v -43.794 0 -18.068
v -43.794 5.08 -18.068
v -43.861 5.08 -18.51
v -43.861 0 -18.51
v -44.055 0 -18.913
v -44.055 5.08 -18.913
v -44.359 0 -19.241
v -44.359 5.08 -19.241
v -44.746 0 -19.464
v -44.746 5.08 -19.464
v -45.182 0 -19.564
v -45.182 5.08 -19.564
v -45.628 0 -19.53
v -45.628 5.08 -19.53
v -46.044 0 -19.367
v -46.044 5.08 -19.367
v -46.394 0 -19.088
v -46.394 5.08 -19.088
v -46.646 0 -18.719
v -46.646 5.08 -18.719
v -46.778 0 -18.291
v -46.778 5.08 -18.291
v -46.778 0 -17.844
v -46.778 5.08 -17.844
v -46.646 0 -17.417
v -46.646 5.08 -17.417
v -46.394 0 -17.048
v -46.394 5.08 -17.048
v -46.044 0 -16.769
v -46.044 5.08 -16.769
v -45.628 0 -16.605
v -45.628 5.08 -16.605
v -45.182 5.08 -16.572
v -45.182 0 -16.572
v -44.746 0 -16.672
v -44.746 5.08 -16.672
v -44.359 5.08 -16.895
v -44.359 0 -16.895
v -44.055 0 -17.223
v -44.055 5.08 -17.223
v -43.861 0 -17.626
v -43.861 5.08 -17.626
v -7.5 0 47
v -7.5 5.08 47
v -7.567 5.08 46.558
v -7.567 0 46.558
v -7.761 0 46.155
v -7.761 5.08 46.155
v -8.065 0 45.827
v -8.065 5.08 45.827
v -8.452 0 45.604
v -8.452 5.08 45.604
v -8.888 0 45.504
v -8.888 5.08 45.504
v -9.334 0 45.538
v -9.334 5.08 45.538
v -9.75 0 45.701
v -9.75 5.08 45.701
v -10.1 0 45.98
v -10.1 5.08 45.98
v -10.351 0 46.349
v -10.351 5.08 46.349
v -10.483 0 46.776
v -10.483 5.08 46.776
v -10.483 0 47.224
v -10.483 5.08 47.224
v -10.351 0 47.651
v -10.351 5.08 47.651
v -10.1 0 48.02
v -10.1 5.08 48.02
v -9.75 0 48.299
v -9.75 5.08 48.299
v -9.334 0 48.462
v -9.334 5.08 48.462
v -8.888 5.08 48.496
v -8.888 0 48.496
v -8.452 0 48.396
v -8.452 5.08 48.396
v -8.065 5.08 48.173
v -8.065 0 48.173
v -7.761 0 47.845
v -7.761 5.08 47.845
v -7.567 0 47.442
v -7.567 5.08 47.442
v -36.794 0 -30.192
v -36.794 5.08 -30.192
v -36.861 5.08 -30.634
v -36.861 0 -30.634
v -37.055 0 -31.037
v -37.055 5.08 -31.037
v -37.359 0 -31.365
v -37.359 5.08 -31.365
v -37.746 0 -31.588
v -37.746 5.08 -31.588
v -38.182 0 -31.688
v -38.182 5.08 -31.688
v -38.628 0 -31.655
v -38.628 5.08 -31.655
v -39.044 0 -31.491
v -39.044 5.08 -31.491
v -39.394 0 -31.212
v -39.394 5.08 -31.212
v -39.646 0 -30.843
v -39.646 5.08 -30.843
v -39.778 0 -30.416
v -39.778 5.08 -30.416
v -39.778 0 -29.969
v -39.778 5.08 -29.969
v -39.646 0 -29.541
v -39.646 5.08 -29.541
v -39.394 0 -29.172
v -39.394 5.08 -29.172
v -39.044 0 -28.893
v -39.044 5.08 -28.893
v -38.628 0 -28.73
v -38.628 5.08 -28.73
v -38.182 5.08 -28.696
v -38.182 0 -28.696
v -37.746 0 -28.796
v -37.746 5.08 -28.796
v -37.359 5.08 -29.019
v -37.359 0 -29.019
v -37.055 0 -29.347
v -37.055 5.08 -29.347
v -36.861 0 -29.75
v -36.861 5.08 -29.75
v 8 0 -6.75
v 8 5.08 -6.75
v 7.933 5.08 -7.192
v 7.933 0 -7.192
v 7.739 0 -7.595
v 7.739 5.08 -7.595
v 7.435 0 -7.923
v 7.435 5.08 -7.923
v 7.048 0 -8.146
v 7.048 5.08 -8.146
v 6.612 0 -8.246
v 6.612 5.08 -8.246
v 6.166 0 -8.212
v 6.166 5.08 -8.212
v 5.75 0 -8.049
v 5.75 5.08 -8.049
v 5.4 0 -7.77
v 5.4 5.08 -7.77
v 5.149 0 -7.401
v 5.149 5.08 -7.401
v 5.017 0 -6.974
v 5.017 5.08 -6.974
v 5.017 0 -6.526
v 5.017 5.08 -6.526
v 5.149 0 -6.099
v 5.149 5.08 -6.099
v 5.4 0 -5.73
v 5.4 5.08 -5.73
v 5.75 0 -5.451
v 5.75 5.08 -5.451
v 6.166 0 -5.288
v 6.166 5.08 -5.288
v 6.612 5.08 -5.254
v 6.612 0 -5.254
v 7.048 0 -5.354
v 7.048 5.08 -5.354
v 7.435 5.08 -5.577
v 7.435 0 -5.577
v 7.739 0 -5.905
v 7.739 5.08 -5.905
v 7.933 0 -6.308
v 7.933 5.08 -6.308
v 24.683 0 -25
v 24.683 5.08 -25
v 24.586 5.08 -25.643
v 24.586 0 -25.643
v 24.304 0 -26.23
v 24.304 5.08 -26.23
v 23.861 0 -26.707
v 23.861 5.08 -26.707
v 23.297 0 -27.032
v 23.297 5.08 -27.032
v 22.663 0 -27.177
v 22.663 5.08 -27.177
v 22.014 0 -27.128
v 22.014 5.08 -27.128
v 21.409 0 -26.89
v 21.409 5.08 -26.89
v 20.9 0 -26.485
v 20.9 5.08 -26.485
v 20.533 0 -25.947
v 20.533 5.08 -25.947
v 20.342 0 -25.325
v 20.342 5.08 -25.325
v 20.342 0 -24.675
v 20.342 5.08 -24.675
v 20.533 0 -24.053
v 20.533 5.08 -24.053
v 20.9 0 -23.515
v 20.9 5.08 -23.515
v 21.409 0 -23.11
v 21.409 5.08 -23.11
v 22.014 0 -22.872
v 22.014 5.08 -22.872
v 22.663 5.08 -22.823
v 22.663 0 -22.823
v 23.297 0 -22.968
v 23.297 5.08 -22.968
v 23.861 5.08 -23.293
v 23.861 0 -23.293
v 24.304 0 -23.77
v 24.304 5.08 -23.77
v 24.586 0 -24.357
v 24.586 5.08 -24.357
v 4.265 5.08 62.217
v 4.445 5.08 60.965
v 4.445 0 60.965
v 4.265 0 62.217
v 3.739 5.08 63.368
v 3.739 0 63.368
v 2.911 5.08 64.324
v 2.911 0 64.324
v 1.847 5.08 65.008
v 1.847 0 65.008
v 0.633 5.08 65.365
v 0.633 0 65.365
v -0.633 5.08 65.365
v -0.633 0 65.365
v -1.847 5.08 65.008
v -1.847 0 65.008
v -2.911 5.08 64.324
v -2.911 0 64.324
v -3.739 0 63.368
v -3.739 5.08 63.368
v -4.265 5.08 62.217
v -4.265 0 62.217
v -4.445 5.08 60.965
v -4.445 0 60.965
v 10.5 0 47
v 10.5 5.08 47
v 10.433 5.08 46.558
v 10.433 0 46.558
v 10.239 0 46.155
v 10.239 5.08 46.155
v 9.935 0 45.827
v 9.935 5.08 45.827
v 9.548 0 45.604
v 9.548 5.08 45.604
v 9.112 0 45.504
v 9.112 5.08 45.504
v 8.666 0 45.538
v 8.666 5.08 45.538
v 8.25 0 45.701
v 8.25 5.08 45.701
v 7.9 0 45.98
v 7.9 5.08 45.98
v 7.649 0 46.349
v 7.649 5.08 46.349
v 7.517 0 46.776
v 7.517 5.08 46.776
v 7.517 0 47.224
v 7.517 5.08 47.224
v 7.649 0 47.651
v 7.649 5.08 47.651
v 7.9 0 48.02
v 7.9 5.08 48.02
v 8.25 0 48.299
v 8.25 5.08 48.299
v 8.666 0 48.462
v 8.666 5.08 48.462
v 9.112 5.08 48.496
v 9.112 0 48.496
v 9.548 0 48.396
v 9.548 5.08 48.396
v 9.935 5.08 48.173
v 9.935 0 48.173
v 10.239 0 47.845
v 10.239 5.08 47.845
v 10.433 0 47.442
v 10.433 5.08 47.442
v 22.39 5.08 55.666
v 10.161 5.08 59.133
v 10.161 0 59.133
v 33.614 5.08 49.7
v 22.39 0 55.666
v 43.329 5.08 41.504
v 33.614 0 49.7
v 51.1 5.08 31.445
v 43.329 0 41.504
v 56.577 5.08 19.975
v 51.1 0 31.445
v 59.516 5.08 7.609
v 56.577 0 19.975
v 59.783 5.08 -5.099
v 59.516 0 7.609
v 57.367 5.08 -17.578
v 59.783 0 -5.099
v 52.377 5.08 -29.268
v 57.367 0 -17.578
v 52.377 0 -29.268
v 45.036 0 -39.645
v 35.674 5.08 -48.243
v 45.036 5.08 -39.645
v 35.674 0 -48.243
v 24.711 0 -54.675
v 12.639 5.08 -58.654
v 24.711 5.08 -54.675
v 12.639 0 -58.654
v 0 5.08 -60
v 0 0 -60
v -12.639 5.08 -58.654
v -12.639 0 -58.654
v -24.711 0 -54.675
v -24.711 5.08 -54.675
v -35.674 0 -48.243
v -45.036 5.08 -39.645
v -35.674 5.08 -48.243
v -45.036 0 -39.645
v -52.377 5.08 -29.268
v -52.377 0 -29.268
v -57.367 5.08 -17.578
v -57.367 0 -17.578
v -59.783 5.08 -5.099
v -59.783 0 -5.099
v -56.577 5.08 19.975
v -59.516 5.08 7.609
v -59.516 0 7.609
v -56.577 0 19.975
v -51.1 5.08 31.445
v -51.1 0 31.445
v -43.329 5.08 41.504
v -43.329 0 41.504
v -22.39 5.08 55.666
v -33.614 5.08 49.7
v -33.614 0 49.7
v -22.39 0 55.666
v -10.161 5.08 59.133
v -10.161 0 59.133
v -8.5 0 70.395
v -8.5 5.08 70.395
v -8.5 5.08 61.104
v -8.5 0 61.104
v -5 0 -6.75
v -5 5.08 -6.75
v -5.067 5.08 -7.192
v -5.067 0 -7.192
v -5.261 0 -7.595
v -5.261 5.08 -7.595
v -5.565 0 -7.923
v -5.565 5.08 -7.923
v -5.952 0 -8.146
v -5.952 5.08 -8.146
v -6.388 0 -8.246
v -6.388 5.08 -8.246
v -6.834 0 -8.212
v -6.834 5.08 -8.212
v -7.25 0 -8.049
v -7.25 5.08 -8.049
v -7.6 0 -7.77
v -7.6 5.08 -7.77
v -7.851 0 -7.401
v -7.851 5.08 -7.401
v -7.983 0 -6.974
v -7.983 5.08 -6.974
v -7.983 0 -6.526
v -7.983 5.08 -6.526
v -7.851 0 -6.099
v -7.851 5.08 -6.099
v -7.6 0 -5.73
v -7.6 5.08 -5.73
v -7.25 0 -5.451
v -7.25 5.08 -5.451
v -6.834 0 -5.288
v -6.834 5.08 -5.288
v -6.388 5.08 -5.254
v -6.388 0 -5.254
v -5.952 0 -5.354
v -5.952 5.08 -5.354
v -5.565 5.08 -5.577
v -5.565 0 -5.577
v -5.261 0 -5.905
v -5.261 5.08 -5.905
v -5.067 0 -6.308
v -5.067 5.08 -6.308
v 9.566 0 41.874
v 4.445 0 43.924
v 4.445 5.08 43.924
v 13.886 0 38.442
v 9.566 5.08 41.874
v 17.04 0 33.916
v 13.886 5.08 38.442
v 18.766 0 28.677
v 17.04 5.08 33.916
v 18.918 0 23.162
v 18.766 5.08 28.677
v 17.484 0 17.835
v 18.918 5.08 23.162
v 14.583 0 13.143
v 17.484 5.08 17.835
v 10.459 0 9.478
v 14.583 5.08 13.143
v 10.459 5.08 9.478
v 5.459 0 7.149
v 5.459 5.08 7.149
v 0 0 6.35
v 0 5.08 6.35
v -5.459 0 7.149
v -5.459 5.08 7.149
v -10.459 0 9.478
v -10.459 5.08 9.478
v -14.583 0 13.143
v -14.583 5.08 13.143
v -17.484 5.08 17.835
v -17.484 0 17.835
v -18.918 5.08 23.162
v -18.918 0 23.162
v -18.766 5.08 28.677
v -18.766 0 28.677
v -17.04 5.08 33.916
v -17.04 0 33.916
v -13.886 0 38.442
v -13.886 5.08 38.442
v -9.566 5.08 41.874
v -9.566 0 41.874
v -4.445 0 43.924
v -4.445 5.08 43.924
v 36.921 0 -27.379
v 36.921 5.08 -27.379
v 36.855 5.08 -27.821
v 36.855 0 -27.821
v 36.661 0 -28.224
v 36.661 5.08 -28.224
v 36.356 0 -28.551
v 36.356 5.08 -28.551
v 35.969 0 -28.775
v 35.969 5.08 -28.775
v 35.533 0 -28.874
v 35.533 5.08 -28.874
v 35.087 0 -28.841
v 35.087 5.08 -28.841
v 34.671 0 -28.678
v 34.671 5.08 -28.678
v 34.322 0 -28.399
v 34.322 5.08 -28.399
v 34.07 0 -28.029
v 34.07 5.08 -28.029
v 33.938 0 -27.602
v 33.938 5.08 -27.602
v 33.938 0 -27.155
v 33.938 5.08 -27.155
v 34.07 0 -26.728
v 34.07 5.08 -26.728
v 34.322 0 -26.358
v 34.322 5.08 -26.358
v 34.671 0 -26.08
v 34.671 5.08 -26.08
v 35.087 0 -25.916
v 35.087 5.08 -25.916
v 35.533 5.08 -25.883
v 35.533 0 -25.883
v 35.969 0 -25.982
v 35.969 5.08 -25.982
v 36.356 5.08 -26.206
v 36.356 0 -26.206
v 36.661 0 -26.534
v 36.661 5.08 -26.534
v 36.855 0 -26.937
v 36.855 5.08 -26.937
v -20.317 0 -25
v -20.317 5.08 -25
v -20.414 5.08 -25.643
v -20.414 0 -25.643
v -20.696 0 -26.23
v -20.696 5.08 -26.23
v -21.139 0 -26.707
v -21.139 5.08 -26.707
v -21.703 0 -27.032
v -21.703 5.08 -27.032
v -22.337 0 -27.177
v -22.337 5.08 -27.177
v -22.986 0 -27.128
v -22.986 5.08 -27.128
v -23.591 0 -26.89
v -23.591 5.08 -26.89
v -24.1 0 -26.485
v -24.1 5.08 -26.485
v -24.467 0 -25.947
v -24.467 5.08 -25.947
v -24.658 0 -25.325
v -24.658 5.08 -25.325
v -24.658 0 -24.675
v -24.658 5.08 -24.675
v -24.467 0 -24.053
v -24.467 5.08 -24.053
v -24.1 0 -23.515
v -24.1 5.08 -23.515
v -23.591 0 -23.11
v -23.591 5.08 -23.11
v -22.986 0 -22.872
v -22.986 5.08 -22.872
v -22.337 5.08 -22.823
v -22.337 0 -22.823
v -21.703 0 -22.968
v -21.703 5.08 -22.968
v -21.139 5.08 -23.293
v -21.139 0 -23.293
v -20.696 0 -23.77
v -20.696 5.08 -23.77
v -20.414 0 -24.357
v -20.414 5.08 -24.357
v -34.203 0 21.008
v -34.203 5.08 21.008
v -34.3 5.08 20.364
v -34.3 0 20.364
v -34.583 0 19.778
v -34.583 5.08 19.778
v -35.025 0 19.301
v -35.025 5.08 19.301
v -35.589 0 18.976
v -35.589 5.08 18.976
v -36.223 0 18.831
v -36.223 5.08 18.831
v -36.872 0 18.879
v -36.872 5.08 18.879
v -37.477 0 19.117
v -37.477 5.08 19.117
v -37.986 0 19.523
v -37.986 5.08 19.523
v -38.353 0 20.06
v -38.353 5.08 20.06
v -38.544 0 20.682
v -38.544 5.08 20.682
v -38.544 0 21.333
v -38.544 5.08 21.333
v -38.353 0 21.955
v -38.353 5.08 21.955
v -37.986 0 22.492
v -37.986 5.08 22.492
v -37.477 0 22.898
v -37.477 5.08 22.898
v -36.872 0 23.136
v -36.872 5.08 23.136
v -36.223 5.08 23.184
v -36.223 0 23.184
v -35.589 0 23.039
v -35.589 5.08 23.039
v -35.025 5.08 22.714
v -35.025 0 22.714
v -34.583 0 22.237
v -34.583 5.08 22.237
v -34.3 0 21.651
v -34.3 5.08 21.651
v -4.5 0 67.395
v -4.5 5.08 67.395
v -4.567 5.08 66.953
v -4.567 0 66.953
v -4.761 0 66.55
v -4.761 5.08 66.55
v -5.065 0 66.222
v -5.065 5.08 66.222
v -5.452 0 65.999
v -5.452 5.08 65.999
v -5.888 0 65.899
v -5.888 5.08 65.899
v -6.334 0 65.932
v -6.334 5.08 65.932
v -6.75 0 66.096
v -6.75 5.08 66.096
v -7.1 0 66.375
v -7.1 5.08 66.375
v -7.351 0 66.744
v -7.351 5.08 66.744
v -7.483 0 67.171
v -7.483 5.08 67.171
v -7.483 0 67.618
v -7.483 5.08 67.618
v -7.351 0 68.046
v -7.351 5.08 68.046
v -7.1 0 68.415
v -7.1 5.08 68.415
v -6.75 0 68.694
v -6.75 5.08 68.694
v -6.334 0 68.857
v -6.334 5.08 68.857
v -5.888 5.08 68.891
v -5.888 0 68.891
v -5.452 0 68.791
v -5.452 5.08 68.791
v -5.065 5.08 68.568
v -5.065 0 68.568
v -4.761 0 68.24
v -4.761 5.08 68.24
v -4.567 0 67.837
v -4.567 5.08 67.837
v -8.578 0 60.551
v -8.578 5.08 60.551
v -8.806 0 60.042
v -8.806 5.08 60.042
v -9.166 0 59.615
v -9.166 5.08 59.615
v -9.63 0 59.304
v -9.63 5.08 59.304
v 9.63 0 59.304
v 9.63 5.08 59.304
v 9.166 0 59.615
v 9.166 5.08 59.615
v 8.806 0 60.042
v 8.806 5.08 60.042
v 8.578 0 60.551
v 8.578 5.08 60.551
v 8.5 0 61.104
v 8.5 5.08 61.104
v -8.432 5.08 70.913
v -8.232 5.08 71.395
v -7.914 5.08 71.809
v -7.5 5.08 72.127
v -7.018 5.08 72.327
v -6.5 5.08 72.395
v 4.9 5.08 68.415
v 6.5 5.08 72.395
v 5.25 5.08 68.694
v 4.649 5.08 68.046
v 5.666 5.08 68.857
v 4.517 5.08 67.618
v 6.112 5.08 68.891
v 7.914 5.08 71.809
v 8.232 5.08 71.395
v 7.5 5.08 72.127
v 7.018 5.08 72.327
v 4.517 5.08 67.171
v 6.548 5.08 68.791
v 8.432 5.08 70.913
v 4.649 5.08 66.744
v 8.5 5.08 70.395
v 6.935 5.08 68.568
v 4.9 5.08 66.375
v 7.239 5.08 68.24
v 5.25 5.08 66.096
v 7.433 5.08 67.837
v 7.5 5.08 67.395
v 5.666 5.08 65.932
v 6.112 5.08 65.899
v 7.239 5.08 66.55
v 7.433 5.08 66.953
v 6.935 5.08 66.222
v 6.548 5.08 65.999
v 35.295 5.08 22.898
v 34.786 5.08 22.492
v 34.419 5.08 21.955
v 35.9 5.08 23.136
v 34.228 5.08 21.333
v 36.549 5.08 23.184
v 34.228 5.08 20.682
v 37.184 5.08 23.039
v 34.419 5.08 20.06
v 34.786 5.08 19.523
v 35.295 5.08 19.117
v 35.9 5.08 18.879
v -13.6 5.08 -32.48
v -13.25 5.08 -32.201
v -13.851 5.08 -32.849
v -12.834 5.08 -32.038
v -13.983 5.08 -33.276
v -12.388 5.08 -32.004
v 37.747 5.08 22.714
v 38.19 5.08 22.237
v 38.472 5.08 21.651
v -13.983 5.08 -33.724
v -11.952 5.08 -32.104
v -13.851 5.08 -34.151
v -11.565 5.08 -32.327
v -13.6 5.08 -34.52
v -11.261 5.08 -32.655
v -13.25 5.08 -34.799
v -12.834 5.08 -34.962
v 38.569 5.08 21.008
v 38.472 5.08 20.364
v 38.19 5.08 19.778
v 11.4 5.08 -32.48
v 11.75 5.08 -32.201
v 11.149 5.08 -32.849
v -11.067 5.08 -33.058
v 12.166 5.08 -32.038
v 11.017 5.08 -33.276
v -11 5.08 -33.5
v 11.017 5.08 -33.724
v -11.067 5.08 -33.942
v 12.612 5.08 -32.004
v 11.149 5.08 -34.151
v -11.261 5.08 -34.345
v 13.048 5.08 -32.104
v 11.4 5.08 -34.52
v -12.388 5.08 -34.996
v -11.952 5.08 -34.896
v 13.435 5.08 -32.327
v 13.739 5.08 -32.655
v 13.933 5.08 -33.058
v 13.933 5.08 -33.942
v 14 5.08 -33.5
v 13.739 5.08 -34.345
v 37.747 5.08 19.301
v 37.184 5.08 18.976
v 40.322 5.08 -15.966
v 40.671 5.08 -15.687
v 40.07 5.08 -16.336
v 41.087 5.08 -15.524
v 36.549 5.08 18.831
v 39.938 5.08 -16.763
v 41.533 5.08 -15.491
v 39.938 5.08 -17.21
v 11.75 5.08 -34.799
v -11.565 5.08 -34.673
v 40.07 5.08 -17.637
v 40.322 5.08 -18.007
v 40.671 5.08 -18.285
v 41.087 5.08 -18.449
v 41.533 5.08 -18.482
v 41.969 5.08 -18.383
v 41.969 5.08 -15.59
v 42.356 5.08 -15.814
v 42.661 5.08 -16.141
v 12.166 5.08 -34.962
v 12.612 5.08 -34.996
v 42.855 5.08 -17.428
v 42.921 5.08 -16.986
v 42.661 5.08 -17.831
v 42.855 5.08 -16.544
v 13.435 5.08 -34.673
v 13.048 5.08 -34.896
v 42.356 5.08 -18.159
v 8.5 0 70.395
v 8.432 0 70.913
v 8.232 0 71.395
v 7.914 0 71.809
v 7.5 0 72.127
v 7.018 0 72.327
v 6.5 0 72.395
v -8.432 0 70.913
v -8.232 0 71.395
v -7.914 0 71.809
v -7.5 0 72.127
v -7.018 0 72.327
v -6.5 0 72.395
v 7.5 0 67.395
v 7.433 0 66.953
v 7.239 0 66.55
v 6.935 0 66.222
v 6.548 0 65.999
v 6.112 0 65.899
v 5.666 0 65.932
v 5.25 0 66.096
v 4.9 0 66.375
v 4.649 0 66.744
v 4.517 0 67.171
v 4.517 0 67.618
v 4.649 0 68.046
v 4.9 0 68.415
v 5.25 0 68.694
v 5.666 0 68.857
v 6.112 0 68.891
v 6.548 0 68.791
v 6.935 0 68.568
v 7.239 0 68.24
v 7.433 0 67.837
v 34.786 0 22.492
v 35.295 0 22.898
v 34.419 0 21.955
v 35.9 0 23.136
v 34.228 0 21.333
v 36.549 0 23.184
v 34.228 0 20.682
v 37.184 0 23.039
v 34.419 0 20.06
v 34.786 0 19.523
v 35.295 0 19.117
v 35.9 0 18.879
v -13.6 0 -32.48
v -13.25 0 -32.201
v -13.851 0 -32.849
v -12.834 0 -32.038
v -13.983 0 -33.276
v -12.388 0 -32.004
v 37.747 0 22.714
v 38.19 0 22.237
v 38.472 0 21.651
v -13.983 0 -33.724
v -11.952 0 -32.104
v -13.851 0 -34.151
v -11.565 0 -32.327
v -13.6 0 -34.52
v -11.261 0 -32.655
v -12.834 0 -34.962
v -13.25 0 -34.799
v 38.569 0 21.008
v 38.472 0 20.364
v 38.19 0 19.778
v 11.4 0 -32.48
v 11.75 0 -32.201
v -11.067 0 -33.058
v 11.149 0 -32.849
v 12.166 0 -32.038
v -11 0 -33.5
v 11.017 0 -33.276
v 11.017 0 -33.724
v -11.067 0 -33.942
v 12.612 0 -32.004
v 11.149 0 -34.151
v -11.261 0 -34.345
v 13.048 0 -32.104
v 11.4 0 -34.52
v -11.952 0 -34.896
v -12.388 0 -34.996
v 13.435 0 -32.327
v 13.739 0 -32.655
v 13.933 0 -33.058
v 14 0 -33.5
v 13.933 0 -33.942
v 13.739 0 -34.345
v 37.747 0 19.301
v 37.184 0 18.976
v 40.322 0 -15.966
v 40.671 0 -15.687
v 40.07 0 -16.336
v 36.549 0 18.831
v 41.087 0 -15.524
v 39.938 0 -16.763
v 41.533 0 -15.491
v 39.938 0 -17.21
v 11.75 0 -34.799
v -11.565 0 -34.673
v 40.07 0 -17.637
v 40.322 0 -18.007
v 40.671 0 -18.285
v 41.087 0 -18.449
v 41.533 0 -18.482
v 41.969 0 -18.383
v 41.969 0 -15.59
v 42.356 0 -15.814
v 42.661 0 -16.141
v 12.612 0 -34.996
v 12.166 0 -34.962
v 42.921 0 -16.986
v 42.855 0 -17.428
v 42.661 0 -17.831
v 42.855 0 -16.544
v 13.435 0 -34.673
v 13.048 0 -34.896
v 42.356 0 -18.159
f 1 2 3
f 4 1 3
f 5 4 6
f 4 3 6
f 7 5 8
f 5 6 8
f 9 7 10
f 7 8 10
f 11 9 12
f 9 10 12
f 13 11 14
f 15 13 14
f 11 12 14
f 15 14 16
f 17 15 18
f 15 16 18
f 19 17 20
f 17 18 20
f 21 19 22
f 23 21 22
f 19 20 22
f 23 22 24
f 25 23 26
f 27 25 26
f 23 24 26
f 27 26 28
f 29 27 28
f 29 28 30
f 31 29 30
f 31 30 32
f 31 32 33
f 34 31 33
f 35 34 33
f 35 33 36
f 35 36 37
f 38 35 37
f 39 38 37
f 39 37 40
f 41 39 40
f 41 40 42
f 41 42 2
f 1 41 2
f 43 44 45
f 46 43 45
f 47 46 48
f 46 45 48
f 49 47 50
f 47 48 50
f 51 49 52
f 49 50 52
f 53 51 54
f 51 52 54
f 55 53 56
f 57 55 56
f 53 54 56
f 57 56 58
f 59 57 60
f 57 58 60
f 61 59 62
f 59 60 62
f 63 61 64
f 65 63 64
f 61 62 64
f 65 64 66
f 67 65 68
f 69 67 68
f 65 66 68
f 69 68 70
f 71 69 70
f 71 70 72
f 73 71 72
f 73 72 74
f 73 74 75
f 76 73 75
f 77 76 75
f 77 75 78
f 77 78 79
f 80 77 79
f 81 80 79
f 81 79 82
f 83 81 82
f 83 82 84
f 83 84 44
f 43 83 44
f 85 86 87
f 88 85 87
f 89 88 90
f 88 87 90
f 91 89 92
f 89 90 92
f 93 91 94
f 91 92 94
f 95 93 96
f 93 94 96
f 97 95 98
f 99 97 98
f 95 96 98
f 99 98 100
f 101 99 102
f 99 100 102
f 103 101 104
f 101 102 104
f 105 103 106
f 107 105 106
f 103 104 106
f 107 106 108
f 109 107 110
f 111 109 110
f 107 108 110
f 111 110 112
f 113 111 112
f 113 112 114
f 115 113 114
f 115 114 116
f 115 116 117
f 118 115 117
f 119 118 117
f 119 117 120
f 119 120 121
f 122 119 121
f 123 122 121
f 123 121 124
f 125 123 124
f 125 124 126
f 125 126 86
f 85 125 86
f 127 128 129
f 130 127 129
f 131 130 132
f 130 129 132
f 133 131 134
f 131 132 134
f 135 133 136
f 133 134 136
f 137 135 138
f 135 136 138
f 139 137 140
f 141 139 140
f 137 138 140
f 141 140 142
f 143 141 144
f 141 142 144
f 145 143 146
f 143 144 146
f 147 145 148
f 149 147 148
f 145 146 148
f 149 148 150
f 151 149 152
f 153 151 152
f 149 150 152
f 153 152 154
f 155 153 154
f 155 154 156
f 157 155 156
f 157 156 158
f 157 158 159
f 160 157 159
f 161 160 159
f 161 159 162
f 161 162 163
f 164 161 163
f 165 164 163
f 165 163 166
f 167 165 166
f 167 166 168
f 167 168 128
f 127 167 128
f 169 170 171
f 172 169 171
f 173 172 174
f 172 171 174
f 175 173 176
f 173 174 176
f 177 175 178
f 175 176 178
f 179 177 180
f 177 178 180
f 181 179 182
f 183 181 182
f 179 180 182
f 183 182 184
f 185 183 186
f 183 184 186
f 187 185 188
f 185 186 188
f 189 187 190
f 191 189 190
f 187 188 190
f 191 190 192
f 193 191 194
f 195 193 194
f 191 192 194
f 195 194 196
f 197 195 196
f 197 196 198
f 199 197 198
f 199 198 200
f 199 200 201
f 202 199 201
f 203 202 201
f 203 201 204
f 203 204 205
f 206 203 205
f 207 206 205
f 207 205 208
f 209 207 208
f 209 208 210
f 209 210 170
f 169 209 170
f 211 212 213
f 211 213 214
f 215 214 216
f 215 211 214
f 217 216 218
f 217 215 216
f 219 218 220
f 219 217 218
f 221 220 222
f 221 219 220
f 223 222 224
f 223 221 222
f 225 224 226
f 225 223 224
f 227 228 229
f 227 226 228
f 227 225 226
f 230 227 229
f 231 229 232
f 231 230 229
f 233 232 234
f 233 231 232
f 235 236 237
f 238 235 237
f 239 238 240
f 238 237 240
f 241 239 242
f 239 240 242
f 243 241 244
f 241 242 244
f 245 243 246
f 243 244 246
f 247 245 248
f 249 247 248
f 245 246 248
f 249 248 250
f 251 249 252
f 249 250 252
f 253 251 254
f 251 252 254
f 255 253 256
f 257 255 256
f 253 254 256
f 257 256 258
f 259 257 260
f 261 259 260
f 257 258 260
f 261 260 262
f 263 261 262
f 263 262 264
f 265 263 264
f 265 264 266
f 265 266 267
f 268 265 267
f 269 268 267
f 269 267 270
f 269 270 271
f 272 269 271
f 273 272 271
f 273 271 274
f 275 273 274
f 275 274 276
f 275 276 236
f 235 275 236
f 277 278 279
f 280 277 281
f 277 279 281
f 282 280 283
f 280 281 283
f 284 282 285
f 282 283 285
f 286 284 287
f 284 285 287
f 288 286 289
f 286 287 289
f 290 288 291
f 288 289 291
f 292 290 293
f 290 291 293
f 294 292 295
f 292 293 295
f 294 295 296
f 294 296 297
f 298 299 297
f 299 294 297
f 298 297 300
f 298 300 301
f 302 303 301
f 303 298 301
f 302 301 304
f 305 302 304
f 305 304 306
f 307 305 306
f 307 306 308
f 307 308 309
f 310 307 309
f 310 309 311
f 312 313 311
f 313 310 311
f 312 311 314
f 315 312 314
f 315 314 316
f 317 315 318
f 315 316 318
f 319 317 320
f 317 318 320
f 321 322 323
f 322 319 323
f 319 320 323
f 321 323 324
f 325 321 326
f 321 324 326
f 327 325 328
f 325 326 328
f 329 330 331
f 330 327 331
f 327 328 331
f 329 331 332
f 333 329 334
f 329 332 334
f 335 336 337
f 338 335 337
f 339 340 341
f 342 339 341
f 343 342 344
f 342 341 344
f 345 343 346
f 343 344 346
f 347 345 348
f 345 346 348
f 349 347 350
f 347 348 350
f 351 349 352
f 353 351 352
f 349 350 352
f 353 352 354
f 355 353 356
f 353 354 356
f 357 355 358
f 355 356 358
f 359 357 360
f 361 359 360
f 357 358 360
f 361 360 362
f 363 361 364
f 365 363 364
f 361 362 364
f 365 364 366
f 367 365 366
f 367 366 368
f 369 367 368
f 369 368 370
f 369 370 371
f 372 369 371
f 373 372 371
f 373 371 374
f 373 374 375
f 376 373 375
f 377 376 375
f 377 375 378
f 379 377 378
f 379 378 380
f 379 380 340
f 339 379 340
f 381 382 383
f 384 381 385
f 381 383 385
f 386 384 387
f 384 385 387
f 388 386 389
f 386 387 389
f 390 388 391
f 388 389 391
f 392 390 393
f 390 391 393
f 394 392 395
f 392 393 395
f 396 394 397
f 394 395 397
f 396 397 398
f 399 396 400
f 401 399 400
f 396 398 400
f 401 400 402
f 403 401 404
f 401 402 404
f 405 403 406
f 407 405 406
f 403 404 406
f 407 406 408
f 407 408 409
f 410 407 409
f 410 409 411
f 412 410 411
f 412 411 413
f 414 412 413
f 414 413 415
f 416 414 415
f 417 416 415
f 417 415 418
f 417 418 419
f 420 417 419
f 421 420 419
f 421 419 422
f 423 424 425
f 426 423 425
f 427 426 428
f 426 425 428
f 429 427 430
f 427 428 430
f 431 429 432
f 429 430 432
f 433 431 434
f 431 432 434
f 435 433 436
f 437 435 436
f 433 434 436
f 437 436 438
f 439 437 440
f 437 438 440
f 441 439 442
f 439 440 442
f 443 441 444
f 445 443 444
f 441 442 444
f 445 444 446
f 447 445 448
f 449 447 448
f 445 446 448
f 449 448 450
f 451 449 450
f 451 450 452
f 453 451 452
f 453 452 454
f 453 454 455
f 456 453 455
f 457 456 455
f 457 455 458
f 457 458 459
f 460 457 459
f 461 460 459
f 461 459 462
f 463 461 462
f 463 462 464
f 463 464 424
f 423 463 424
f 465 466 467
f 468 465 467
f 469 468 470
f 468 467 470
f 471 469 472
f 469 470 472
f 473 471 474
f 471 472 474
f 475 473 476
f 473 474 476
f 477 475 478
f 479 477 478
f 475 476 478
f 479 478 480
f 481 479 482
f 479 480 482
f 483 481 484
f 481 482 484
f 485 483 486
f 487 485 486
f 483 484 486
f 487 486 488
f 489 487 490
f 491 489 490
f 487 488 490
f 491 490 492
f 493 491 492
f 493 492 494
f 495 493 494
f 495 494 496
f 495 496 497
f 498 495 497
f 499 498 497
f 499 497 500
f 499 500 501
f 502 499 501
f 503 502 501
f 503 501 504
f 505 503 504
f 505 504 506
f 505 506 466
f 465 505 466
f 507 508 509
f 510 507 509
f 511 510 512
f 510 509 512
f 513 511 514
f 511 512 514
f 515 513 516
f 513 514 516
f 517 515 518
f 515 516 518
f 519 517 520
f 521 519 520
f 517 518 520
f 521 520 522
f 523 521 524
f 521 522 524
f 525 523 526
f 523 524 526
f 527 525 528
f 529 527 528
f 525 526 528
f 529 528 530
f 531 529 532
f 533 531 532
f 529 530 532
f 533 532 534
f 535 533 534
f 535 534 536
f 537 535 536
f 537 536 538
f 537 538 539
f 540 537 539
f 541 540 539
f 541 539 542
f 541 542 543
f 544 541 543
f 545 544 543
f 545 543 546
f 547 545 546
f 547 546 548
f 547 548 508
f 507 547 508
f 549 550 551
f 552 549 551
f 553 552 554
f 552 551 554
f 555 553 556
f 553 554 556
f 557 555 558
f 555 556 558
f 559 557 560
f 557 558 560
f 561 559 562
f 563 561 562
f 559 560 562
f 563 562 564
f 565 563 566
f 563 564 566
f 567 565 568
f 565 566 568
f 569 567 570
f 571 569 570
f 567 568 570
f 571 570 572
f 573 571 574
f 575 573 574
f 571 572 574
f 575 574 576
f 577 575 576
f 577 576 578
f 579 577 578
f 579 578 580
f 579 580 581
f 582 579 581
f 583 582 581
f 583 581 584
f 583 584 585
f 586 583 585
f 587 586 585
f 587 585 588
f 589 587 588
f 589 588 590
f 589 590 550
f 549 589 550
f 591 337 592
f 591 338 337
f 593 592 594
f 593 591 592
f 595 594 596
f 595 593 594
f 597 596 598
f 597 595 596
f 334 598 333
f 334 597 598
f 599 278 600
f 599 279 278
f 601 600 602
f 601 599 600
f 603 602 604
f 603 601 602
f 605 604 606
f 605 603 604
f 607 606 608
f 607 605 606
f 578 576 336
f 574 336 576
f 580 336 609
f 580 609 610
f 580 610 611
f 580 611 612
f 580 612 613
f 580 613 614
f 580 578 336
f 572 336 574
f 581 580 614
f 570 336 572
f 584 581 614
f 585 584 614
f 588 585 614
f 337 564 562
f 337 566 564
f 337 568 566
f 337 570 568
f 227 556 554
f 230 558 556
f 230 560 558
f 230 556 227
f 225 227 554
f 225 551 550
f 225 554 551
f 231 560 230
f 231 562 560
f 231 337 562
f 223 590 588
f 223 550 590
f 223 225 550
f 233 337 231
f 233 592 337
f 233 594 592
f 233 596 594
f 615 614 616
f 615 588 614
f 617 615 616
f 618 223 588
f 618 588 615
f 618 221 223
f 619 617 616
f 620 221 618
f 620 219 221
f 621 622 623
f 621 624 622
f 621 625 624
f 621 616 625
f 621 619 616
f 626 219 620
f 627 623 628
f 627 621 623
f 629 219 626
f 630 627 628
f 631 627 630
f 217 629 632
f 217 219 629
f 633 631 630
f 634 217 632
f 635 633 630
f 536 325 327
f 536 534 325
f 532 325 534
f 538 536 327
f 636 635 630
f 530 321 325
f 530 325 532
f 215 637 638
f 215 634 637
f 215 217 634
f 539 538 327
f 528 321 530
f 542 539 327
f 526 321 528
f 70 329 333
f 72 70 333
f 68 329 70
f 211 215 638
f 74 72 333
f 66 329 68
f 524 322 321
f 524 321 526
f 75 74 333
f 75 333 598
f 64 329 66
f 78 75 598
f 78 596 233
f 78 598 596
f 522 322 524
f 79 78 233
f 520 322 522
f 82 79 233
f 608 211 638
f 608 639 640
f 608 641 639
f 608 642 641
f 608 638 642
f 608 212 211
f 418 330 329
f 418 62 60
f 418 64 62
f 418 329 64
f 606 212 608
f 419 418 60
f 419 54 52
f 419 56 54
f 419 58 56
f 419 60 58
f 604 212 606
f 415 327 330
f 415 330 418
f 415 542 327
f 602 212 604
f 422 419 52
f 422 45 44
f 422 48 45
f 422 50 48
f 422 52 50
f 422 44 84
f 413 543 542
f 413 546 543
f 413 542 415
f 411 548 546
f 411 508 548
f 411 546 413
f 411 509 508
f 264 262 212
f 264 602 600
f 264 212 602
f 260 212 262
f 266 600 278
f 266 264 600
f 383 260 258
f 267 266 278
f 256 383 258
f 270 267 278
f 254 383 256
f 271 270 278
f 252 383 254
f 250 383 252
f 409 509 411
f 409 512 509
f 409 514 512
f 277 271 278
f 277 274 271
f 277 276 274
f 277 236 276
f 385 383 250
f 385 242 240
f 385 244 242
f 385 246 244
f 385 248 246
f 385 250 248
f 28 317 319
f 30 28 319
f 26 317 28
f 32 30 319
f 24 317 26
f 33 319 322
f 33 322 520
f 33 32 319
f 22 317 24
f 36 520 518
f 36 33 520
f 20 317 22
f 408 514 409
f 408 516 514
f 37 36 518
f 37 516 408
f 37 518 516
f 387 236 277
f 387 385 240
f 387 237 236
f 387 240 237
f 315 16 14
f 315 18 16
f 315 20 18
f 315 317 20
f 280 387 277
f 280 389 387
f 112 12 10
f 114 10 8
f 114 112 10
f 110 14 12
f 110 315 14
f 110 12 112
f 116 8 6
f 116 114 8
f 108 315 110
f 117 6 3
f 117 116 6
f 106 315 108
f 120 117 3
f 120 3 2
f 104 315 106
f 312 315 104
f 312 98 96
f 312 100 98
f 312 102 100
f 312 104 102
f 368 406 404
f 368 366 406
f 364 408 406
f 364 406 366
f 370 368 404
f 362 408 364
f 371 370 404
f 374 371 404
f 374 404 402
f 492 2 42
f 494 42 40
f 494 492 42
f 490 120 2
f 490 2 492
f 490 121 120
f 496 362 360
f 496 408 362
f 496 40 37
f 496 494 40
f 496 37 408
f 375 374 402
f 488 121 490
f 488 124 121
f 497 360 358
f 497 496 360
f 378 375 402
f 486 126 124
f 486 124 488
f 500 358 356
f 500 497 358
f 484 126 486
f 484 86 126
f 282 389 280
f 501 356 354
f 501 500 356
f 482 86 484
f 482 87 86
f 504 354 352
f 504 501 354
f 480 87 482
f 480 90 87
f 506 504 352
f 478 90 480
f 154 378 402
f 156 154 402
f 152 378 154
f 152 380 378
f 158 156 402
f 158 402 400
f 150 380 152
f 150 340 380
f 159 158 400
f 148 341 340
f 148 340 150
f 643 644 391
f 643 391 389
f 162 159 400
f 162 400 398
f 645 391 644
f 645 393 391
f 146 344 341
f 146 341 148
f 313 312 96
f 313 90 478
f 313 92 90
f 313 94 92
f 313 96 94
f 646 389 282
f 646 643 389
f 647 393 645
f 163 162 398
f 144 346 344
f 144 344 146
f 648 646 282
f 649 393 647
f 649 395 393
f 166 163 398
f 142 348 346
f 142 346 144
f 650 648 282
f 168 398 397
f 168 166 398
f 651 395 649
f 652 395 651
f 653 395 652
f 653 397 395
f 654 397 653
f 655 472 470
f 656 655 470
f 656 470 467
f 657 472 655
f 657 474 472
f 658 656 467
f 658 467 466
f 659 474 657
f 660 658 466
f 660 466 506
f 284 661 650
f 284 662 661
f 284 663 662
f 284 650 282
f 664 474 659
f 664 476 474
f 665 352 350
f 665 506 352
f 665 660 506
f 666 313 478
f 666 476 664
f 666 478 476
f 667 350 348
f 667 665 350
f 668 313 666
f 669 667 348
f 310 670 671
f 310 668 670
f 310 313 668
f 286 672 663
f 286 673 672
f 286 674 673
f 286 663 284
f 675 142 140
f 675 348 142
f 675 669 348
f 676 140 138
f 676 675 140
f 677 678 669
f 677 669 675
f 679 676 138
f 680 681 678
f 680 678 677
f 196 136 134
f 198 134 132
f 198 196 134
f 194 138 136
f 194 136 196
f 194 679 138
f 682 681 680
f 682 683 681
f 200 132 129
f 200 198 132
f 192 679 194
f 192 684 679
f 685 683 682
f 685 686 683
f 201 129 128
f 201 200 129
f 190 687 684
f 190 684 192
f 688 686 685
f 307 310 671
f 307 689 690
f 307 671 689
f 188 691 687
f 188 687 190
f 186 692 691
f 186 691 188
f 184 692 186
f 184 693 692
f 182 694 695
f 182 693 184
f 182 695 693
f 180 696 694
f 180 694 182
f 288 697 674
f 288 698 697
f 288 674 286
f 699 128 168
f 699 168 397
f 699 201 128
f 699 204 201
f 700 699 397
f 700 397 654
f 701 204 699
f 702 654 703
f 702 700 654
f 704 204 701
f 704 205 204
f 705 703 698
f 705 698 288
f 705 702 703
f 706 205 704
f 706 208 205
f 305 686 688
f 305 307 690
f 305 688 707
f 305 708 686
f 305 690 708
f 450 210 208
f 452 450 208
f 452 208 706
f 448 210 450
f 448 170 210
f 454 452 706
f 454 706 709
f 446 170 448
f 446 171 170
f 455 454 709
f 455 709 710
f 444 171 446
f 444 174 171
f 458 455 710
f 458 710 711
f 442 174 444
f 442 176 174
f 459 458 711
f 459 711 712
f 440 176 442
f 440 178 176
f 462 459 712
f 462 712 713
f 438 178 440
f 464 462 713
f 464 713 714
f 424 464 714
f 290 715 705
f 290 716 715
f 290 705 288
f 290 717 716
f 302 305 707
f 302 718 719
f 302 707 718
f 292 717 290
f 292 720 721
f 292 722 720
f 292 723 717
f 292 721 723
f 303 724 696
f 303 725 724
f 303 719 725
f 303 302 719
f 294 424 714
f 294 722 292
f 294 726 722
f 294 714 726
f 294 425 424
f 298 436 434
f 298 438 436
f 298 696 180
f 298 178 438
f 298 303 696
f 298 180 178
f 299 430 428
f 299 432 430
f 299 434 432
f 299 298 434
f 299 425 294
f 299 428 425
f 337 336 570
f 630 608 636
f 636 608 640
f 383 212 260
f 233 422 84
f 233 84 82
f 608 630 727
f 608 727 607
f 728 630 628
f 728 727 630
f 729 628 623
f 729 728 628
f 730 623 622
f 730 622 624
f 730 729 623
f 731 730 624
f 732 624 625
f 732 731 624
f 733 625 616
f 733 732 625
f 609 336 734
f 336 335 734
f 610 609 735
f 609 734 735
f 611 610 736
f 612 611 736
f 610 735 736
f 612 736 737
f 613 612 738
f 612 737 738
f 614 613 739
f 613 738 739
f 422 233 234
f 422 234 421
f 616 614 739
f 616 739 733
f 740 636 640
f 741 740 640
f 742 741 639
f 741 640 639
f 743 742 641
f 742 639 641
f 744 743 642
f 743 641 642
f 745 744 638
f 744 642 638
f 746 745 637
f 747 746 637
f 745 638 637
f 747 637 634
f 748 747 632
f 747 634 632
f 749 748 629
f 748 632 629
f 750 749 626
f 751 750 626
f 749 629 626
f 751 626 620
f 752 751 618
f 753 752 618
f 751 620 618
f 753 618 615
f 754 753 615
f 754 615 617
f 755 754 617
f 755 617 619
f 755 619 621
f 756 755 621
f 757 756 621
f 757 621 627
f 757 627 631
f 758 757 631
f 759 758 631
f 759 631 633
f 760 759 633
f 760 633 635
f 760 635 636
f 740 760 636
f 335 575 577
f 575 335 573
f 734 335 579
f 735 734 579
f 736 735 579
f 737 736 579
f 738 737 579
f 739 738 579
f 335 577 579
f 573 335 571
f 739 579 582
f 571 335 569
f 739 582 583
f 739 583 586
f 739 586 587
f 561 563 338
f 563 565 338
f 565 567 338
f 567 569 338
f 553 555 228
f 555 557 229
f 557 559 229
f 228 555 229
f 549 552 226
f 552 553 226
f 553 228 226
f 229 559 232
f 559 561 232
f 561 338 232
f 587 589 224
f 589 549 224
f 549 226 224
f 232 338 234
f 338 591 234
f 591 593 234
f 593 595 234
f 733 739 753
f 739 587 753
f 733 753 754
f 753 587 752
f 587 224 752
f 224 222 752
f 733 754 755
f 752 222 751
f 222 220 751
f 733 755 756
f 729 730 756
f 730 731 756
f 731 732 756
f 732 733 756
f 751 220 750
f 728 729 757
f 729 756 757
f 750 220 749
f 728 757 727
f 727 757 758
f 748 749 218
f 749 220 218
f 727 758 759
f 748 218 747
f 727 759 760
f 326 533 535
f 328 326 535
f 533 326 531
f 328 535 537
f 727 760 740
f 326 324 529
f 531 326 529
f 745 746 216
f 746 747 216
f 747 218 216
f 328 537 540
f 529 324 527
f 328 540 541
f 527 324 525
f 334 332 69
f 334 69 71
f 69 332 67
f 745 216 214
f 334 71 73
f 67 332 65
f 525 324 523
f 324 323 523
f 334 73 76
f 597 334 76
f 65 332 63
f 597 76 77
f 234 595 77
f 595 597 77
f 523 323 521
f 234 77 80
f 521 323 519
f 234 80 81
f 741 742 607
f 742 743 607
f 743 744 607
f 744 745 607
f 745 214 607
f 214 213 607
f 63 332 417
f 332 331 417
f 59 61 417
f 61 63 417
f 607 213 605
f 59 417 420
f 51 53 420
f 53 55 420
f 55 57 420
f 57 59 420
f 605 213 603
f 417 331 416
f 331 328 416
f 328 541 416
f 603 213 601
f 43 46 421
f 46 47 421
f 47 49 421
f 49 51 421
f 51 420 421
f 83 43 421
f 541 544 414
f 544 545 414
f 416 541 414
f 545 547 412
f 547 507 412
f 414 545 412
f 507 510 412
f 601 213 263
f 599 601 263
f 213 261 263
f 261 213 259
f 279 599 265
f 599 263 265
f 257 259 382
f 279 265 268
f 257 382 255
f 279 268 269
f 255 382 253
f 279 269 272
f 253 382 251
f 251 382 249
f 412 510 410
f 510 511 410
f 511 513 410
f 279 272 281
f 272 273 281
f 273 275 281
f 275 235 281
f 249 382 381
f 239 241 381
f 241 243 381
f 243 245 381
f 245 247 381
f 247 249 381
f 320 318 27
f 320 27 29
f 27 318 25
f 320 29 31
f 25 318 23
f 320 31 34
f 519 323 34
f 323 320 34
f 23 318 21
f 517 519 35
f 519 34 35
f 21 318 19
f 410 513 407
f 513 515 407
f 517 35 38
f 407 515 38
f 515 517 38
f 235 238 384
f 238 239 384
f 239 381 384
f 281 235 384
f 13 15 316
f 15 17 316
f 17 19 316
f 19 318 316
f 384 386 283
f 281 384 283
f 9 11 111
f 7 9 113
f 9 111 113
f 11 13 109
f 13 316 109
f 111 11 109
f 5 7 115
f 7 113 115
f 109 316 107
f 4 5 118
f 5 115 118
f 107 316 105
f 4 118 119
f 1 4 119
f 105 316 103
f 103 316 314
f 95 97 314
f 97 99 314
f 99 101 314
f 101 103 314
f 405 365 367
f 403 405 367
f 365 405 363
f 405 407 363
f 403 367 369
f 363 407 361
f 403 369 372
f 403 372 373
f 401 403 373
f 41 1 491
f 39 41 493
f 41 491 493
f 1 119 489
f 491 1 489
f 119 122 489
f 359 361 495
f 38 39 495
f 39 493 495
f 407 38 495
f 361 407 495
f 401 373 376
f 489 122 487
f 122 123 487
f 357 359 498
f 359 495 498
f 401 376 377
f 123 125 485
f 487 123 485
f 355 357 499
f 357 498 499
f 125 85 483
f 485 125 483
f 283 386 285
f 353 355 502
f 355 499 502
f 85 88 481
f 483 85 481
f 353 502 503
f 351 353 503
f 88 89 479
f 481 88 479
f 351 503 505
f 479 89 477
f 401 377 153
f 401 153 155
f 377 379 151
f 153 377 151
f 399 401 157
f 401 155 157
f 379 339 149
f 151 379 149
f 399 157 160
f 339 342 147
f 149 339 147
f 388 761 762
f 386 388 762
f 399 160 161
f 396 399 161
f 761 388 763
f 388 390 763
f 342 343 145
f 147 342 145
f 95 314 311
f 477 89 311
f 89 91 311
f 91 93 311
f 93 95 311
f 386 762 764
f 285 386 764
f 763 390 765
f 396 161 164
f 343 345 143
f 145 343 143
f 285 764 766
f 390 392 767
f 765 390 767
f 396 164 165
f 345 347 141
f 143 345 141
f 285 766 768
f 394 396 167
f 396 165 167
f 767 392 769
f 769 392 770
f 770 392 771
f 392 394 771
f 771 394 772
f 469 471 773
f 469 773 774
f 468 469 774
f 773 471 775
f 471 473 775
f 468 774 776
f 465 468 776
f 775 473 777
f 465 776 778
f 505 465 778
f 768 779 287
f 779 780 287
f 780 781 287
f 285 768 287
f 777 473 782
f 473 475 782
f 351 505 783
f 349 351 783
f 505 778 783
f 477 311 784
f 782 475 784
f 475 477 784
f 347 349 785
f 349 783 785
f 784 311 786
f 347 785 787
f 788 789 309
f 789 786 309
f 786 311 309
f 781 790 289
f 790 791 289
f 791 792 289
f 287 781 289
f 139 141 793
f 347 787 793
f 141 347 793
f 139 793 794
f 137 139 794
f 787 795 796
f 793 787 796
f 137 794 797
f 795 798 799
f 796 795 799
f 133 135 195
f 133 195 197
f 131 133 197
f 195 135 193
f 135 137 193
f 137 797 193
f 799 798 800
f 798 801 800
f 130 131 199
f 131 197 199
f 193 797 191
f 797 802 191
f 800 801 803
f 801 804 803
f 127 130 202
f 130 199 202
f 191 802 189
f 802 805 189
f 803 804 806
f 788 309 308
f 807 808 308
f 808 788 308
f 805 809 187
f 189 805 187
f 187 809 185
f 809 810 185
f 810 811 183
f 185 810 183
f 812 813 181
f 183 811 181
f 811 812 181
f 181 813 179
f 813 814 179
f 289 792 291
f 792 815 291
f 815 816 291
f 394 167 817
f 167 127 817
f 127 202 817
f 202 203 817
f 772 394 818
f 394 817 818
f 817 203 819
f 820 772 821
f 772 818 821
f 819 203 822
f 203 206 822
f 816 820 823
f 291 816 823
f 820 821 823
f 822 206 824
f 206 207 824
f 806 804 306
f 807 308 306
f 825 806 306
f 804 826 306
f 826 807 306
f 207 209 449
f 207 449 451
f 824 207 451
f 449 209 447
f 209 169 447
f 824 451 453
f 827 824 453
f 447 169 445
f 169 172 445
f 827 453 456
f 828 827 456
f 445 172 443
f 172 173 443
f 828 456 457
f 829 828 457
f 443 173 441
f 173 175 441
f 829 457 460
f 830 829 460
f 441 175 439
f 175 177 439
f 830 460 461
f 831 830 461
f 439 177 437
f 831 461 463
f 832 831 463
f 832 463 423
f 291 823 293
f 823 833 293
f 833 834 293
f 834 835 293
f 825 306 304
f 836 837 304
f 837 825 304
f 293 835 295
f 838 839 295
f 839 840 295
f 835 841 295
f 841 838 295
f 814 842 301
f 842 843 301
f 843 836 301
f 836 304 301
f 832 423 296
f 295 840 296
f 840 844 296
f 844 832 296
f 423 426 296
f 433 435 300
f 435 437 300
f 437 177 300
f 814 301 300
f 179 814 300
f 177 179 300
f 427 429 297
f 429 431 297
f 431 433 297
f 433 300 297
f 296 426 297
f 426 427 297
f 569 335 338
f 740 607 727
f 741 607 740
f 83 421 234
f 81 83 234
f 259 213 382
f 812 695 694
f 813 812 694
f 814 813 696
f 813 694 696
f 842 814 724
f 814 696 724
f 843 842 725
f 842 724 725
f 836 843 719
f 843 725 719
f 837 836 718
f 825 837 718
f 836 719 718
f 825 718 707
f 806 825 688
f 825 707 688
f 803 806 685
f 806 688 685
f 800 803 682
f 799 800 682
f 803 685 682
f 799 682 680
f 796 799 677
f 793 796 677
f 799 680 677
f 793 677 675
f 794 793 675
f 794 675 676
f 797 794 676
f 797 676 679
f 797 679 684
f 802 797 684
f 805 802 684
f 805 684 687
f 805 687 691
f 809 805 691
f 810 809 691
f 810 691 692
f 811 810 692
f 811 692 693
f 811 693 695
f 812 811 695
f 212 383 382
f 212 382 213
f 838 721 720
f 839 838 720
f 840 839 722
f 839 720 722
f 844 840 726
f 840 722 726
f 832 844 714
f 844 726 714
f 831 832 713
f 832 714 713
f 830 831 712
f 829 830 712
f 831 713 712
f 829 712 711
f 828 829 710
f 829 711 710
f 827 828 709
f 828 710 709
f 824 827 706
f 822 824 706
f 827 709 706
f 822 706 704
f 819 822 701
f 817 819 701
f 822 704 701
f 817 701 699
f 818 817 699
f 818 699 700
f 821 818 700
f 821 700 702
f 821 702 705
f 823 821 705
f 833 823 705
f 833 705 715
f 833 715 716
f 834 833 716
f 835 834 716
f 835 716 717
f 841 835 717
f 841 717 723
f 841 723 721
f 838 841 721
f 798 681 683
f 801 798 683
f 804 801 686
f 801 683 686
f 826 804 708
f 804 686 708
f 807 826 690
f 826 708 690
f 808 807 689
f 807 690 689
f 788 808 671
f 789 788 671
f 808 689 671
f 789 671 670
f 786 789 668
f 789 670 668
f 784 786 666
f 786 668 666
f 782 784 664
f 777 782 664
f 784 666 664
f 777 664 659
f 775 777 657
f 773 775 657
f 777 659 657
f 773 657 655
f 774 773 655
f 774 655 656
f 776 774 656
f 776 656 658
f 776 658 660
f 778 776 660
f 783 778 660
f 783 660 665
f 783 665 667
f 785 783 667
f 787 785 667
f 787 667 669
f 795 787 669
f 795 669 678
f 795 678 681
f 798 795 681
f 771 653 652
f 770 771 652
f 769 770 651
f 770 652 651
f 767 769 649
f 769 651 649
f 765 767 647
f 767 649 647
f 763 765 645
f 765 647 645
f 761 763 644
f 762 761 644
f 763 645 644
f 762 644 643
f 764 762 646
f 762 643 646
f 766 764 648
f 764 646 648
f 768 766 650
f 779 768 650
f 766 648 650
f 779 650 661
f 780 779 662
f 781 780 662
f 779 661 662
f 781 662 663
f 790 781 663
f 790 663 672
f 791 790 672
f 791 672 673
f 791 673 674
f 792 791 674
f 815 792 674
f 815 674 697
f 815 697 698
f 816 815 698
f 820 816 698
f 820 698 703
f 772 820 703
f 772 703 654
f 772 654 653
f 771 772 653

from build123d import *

# Parameters (mm, degrees)
SKETCH1_R           = 60
BOSS_EXTRUDE1_DEPTH = 5.08
SKETCH2_R           = 2.1828125
CUT_EXTRUDE1_DEPTH  = 6.08
CIRPATTERN1_COUNT   = 2
CIRPATTERN1_ANGLE   = 120
SKETCH3_R           = 1.5
CUT_EXTRUDE2_DEPTH  = 6.08
SKETCH5_R           = 2.1828125
CUT_EXTRUDE4_DEPTH  = 6.08
SKETCH6_R           = 19.05
CUT_EXTRUDE5_DEPTH  = 6.08
SKETCH9_W           = 17
SKETCH9_H           = 13
BOSS_EXTRUDE2_DEPTH = 5.08
SKETCH7_R           = 1.5
CUT_EXTRUDE6_DEPTH  = 6.08
FILLET1_R           = 2
FILLET2_R           = 2


with BuildPart() as part:
    # Sketch1 → Boss-Extrude1 (new body)
    with BuildSketch(Plane(origin=(0, 0, 0), x_dir=(1, 0, 0), z_dir=(0, 1, 0))):
        Circle(SKETCH1_R)
    extrude(amount=BOSS_EXTRUDE1_DEPTH)

    # Sketch2 → Cut-Extrude1 (cut, through all)
    with BuildSketch(Plane(origin=(0, 5.08, 0), x_dir=(1, 0, 0), z_dir=(0, 1, 0))):
        with Locations((-36.386057378, -21.007500022)):
            Circle(SKETCH2_R)
    cut_extrude1 = extrude(amount=-CUT_EXTRUDE1_DEPTH, mode=Mode.SUBTRACT)

    # CirPattern1: Cut-Extrude1 ×2 about axis
    cirpattern1_axis = Axis((0, 5.08, 0), (0, 1, 0))
    for i in range(1, CIRPATTERN1_COUNT):
        add(cut_extrude1.rotate(cirpattern1_axis, i * CIRPATTERN1_ANGLE / (CIRPATTERN1_COUNT - 1)), mode=Mode.SUBTRACT)

    # Sketch3 → Cut-Extrude2 (cut, through all)
    with BuildSketch(Plane(origin=(0, 5.08, 0), x_dir=(1, 0, 0), z_dir=(0, 1, 0))):
        with Locations((-6.5, 6.749999962)):
            Circle(SKETCH3_R)
        with Locations((6.5, 6.749999962)):
            Circle(SKETCH3_R)
        with Locations((-12.5, 33.500000056)):
            Circle(SKETCH3_R)
        with Locations((12.5, 33.500000056)):
            Circle(SKETCH3_R)
        with Locations((35.421216966, 27.378652381)):
            Circle(SKETCH3_R)
        with Locations((41.421216966, 16.986347535)):
            Circle(SKETCH3_R)
        with Locations((-45.294385987, 18.067822174)):
            Circle(SKETCH3_R)
        with Locations((-38.294385987, 30.192177826)):
            Circle(SKETCH3_R)
    extrude(amount=-CUT_EXTRUDE2_DEPTH, mode=Mode.SUBTRACT)

    # Sketch5 → Cut-Extrude4 (cut, through all)
    with BuildSketch(Plane(origin=(0, 5.08, 0), x_dir=(1, 0, 0), z_dir=(0, 1, 0))):
        with Locations((-22.5, 25)):
            Circle(SKETCH5_R)
        with Locations((22.5, 25)):
            Circle(SKETCH5_R)
    extrude(amount=-CUT_EXTRUDE4_DEPTH, mode=Mode.SUBTRACT)

    # Sketch6 → Cut-Extrude5 (cut, through all)
    with BuildSketch(Plane(origin=(0, 5.08, 0), x_dir=(1, 0, 0), z_dir=(0, 1, 0))):
        with Locations((0, -25.4)):
            Circle(SKETCH6_R)
    extrude(amount=-CUT_EXTRUDE5_DEPTH, mode=Mode.SUBTRACT)

    # Sketch9 → Boss-Extrude2 (add)
    with BuildSketch(Plane(origin=(0, 5.08, 0), x_dir=(1, 0, 0), z_dir=(0, 1, 0))):
        with Locations((0, -65.894865098)):
            Rectangle(SKETCH9_W, SKETCH9_H)
    extrude(amount=-BOSS_EXTRUDE2_DEPTH)

    # Sketch7 → Cut-Extrude6 (cut, through all)
    with BuildSketch(Plane(origin=(0, 5.08, 0), x_dir=(1, 0, 0), z_dir=(0, 1, 0))):
        with Locations((-9, -47)):
            Circle(SKETCH7_R)
        with Locations((-6, -67.394865098)):
            Circle(SKETCH7_R)
        with Locations((6, -67.394865098)):
            Circle(SKETCH7_R)
        with Locations((9, -47)):
            Circle(SKETCH7_R)
        with BuildLine():
            Line((-4.445, -60.964865098), (-4.445, -43.924159225))
            Line((-4.445, -43.924159225), (4.445, -43.924159225))
            Line((4.445, -43.924159225), (4.445, -60.964865098))
            ThreePointArc((4.445, -60.964865098), (0, -65.409865098), (-4.445, -60.964865098))
        make_face()
    extrude(amount=-CUT_EXTRUDE6_DEPTH, mode=Mode.SUBTRACT)

    # Fillet1
    fillet1_edges = [part.edges().sort_by_distance(p)[0] for p in [
        (8.5, 2.54, 72.394865098),
        (-8.5, 2.54, 72.394865098),
    ]]
    fillet(fillet1_edges, radius=FILLET1_R)

    # Fillet2
    fillet2_edges = [part.edges().sort_by_distance(p)[0] for p in [
        (8.5, 2.54, 59.394865098),
        (-8.5, 2.54, 59.394865098),
    ]]
    fillet(fillet2_edges, radius=FILLET2_R)


solid = part.part
